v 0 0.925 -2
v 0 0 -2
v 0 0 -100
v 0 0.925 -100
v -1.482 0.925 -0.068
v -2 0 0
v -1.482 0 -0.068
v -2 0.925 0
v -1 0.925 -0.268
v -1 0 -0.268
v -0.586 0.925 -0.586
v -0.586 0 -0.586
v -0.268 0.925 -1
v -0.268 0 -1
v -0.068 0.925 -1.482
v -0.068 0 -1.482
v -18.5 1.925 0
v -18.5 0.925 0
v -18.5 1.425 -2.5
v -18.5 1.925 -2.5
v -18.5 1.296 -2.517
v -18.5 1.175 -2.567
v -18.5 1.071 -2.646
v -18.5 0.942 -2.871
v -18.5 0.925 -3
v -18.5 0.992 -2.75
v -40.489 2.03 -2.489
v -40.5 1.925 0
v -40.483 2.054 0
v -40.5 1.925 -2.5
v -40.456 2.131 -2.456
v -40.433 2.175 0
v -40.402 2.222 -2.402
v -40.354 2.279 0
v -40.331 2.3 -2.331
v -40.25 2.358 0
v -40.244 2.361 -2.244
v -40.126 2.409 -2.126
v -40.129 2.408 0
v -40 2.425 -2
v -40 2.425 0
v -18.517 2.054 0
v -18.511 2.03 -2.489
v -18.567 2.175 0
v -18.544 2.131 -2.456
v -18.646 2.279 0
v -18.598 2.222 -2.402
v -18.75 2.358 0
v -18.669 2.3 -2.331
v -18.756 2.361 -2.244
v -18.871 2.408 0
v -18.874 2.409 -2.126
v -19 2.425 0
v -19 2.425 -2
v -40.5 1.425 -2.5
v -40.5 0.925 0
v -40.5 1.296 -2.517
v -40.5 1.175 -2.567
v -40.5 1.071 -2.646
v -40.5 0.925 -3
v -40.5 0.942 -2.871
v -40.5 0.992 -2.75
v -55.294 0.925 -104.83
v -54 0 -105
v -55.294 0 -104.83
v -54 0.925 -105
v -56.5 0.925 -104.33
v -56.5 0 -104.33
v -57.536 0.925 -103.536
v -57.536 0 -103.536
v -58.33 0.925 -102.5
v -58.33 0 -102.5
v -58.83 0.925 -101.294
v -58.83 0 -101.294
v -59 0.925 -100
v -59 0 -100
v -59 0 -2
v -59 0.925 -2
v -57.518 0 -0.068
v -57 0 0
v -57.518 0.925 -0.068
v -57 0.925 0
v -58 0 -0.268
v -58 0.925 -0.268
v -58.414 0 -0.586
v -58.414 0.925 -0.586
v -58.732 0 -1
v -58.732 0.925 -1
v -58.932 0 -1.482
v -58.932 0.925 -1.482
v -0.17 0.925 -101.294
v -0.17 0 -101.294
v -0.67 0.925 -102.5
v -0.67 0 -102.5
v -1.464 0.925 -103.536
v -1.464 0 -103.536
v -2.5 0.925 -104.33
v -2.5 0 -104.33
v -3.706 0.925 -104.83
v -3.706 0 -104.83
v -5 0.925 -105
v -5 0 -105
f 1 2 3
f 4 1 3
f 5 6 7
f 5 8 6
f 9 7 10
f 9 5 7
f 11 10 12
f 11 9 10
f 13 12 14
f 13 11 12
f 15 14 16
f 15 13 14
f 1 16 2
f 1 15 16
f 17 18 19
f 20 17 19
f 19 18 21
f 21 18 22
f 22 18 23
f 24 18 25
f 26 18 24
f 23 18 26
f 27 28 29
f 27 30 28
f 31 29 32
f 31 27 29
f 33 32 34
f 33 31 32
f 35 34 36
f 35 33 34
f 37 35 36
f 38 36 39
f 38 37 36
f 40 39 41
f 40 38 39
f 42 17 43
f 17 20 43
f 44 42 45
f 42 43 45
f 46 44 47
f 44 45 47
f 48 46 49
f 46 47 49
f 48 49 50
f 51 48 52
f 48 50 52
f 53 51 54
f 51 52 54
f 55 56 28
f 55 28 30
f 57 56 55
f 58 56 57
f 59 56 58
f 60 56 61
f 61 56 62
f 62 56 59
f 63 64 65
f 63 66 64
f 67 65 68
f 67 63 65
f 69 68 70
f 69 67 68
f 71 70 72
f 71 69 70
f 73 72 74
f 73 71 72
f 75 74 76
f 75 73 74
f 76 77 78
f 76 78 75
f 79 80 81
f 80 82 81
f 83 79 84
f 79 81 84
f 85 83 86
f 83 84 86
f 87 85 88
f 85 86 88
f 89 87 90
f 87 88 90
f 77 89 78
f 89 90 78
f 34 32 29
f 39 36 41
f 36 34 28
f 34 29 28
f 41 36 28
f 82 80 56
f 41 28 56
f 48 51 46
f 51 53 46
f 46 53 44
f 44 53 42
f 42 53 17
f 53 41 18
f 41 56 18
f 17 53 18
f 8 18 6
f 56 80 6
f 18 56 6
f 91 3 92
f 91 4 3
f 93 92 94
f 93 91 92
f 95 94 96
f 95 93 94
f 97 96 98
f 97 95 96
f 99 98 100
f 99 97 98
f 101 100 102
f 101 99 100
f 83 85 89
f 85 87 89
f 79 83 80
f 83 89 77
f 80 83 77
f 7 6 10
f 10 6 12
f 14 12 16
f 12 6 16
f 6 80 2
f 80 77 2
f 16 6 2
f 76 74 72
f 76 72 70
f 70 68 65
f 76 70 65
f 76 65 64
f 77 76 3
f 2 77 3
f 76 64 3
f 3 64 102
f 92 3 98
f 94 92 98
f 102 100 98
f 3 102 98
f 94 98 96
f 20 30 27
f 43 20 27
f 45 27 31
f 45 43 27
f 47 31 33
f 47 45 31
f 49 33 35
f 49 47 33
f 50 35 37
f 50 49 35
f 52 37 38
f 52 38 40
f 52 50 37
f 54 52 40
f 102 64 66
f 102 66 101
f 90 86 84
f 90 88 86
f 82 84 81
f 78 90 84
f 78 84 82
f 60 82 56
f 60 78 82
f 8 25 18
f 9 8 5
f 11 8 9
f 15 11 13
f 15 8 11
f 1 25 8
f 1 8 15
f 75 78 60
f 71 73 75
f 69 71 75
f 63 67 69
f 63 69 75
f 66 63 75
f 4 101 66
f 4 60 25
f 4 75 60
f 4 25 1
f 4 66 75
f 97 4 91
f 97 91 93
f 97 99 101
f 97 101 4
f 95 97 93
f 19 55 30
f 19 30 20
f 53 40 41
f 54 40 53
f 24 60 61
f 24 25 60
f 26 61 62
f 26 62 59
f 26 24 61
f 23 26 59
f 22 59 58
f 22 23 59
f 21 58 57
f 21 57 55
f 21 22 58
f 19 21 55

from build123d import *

# Parameters (mm, degrees)
SKETCH2_W           = 59
SKETCH2_H           = 105
BOSS_EXTRUDE1_DEPTH = 0.925
SKETCH3_W           = 22
SKETCH3_H           = 2.5
BOSS_EXTRUDE2_DEPTH = 1.5
FILLET1_R           = 0.5
FILLET2_R           = 2
FILLET3_R           = 5


with BuildPart() as part:
    # Sketch2 → Boss-Extrude1 (new body)
    with BuildSketch(Plane(origin=(0, 0, 0), x_dir=(1, 0, 0), z_dir=(0, 1, 0))):
        with Locations((-29.5, 52.5)):
            Rectangle(SKETCH2_W, SKETCH2_H)
    extrude(amount=BOSS_EXTRUDE1_DEPTH)

    # Sketch3 → Boss-Extrude2 (add)
    with BuildSketch(Plane(origin=(0, 0.925, 0), x_dir=(1, 0, 0), z_dir=(0, 1, 0))):
        with Locations((-29.5, 1.25)):
            Rectangle(SKETCH3_W, SKETCH3_H)
    extrude(amount=BOSS_EXTRUDE2_DEPTH)

    # Fillet1
    fillet1_edges = [part.edges().sort_by_distance(p)[0] for p in [
        (-29.5, 0.925, -2.5),
        (-40.5, 2.425, -1.25),
        (-18.5, 2.425, -1.25),
        (-29.5, 2.425, -2.5),
    ]]
    fillet(fillet1_edges, radius=FILLET1_R)

    # Fillet2
    fillet2_edges = [part.edges().sort_by_distance(p)[0] for p in [
        (0, 0.4625, 0),
        (-59, 0.4625, 0),
    ]]
    fillet(fillet2_edges, radius=FILLET2_R)

    # Fillet3
    fillet3_edges = [part.edges().sort_by_distance(p)[0] for p in [
        (-59, 0.4625, -105),
        (0, 0.4625, -105),
    ]]
    fillet(fillet3_edges, radius=FILLET3_R)


solid = part.part
